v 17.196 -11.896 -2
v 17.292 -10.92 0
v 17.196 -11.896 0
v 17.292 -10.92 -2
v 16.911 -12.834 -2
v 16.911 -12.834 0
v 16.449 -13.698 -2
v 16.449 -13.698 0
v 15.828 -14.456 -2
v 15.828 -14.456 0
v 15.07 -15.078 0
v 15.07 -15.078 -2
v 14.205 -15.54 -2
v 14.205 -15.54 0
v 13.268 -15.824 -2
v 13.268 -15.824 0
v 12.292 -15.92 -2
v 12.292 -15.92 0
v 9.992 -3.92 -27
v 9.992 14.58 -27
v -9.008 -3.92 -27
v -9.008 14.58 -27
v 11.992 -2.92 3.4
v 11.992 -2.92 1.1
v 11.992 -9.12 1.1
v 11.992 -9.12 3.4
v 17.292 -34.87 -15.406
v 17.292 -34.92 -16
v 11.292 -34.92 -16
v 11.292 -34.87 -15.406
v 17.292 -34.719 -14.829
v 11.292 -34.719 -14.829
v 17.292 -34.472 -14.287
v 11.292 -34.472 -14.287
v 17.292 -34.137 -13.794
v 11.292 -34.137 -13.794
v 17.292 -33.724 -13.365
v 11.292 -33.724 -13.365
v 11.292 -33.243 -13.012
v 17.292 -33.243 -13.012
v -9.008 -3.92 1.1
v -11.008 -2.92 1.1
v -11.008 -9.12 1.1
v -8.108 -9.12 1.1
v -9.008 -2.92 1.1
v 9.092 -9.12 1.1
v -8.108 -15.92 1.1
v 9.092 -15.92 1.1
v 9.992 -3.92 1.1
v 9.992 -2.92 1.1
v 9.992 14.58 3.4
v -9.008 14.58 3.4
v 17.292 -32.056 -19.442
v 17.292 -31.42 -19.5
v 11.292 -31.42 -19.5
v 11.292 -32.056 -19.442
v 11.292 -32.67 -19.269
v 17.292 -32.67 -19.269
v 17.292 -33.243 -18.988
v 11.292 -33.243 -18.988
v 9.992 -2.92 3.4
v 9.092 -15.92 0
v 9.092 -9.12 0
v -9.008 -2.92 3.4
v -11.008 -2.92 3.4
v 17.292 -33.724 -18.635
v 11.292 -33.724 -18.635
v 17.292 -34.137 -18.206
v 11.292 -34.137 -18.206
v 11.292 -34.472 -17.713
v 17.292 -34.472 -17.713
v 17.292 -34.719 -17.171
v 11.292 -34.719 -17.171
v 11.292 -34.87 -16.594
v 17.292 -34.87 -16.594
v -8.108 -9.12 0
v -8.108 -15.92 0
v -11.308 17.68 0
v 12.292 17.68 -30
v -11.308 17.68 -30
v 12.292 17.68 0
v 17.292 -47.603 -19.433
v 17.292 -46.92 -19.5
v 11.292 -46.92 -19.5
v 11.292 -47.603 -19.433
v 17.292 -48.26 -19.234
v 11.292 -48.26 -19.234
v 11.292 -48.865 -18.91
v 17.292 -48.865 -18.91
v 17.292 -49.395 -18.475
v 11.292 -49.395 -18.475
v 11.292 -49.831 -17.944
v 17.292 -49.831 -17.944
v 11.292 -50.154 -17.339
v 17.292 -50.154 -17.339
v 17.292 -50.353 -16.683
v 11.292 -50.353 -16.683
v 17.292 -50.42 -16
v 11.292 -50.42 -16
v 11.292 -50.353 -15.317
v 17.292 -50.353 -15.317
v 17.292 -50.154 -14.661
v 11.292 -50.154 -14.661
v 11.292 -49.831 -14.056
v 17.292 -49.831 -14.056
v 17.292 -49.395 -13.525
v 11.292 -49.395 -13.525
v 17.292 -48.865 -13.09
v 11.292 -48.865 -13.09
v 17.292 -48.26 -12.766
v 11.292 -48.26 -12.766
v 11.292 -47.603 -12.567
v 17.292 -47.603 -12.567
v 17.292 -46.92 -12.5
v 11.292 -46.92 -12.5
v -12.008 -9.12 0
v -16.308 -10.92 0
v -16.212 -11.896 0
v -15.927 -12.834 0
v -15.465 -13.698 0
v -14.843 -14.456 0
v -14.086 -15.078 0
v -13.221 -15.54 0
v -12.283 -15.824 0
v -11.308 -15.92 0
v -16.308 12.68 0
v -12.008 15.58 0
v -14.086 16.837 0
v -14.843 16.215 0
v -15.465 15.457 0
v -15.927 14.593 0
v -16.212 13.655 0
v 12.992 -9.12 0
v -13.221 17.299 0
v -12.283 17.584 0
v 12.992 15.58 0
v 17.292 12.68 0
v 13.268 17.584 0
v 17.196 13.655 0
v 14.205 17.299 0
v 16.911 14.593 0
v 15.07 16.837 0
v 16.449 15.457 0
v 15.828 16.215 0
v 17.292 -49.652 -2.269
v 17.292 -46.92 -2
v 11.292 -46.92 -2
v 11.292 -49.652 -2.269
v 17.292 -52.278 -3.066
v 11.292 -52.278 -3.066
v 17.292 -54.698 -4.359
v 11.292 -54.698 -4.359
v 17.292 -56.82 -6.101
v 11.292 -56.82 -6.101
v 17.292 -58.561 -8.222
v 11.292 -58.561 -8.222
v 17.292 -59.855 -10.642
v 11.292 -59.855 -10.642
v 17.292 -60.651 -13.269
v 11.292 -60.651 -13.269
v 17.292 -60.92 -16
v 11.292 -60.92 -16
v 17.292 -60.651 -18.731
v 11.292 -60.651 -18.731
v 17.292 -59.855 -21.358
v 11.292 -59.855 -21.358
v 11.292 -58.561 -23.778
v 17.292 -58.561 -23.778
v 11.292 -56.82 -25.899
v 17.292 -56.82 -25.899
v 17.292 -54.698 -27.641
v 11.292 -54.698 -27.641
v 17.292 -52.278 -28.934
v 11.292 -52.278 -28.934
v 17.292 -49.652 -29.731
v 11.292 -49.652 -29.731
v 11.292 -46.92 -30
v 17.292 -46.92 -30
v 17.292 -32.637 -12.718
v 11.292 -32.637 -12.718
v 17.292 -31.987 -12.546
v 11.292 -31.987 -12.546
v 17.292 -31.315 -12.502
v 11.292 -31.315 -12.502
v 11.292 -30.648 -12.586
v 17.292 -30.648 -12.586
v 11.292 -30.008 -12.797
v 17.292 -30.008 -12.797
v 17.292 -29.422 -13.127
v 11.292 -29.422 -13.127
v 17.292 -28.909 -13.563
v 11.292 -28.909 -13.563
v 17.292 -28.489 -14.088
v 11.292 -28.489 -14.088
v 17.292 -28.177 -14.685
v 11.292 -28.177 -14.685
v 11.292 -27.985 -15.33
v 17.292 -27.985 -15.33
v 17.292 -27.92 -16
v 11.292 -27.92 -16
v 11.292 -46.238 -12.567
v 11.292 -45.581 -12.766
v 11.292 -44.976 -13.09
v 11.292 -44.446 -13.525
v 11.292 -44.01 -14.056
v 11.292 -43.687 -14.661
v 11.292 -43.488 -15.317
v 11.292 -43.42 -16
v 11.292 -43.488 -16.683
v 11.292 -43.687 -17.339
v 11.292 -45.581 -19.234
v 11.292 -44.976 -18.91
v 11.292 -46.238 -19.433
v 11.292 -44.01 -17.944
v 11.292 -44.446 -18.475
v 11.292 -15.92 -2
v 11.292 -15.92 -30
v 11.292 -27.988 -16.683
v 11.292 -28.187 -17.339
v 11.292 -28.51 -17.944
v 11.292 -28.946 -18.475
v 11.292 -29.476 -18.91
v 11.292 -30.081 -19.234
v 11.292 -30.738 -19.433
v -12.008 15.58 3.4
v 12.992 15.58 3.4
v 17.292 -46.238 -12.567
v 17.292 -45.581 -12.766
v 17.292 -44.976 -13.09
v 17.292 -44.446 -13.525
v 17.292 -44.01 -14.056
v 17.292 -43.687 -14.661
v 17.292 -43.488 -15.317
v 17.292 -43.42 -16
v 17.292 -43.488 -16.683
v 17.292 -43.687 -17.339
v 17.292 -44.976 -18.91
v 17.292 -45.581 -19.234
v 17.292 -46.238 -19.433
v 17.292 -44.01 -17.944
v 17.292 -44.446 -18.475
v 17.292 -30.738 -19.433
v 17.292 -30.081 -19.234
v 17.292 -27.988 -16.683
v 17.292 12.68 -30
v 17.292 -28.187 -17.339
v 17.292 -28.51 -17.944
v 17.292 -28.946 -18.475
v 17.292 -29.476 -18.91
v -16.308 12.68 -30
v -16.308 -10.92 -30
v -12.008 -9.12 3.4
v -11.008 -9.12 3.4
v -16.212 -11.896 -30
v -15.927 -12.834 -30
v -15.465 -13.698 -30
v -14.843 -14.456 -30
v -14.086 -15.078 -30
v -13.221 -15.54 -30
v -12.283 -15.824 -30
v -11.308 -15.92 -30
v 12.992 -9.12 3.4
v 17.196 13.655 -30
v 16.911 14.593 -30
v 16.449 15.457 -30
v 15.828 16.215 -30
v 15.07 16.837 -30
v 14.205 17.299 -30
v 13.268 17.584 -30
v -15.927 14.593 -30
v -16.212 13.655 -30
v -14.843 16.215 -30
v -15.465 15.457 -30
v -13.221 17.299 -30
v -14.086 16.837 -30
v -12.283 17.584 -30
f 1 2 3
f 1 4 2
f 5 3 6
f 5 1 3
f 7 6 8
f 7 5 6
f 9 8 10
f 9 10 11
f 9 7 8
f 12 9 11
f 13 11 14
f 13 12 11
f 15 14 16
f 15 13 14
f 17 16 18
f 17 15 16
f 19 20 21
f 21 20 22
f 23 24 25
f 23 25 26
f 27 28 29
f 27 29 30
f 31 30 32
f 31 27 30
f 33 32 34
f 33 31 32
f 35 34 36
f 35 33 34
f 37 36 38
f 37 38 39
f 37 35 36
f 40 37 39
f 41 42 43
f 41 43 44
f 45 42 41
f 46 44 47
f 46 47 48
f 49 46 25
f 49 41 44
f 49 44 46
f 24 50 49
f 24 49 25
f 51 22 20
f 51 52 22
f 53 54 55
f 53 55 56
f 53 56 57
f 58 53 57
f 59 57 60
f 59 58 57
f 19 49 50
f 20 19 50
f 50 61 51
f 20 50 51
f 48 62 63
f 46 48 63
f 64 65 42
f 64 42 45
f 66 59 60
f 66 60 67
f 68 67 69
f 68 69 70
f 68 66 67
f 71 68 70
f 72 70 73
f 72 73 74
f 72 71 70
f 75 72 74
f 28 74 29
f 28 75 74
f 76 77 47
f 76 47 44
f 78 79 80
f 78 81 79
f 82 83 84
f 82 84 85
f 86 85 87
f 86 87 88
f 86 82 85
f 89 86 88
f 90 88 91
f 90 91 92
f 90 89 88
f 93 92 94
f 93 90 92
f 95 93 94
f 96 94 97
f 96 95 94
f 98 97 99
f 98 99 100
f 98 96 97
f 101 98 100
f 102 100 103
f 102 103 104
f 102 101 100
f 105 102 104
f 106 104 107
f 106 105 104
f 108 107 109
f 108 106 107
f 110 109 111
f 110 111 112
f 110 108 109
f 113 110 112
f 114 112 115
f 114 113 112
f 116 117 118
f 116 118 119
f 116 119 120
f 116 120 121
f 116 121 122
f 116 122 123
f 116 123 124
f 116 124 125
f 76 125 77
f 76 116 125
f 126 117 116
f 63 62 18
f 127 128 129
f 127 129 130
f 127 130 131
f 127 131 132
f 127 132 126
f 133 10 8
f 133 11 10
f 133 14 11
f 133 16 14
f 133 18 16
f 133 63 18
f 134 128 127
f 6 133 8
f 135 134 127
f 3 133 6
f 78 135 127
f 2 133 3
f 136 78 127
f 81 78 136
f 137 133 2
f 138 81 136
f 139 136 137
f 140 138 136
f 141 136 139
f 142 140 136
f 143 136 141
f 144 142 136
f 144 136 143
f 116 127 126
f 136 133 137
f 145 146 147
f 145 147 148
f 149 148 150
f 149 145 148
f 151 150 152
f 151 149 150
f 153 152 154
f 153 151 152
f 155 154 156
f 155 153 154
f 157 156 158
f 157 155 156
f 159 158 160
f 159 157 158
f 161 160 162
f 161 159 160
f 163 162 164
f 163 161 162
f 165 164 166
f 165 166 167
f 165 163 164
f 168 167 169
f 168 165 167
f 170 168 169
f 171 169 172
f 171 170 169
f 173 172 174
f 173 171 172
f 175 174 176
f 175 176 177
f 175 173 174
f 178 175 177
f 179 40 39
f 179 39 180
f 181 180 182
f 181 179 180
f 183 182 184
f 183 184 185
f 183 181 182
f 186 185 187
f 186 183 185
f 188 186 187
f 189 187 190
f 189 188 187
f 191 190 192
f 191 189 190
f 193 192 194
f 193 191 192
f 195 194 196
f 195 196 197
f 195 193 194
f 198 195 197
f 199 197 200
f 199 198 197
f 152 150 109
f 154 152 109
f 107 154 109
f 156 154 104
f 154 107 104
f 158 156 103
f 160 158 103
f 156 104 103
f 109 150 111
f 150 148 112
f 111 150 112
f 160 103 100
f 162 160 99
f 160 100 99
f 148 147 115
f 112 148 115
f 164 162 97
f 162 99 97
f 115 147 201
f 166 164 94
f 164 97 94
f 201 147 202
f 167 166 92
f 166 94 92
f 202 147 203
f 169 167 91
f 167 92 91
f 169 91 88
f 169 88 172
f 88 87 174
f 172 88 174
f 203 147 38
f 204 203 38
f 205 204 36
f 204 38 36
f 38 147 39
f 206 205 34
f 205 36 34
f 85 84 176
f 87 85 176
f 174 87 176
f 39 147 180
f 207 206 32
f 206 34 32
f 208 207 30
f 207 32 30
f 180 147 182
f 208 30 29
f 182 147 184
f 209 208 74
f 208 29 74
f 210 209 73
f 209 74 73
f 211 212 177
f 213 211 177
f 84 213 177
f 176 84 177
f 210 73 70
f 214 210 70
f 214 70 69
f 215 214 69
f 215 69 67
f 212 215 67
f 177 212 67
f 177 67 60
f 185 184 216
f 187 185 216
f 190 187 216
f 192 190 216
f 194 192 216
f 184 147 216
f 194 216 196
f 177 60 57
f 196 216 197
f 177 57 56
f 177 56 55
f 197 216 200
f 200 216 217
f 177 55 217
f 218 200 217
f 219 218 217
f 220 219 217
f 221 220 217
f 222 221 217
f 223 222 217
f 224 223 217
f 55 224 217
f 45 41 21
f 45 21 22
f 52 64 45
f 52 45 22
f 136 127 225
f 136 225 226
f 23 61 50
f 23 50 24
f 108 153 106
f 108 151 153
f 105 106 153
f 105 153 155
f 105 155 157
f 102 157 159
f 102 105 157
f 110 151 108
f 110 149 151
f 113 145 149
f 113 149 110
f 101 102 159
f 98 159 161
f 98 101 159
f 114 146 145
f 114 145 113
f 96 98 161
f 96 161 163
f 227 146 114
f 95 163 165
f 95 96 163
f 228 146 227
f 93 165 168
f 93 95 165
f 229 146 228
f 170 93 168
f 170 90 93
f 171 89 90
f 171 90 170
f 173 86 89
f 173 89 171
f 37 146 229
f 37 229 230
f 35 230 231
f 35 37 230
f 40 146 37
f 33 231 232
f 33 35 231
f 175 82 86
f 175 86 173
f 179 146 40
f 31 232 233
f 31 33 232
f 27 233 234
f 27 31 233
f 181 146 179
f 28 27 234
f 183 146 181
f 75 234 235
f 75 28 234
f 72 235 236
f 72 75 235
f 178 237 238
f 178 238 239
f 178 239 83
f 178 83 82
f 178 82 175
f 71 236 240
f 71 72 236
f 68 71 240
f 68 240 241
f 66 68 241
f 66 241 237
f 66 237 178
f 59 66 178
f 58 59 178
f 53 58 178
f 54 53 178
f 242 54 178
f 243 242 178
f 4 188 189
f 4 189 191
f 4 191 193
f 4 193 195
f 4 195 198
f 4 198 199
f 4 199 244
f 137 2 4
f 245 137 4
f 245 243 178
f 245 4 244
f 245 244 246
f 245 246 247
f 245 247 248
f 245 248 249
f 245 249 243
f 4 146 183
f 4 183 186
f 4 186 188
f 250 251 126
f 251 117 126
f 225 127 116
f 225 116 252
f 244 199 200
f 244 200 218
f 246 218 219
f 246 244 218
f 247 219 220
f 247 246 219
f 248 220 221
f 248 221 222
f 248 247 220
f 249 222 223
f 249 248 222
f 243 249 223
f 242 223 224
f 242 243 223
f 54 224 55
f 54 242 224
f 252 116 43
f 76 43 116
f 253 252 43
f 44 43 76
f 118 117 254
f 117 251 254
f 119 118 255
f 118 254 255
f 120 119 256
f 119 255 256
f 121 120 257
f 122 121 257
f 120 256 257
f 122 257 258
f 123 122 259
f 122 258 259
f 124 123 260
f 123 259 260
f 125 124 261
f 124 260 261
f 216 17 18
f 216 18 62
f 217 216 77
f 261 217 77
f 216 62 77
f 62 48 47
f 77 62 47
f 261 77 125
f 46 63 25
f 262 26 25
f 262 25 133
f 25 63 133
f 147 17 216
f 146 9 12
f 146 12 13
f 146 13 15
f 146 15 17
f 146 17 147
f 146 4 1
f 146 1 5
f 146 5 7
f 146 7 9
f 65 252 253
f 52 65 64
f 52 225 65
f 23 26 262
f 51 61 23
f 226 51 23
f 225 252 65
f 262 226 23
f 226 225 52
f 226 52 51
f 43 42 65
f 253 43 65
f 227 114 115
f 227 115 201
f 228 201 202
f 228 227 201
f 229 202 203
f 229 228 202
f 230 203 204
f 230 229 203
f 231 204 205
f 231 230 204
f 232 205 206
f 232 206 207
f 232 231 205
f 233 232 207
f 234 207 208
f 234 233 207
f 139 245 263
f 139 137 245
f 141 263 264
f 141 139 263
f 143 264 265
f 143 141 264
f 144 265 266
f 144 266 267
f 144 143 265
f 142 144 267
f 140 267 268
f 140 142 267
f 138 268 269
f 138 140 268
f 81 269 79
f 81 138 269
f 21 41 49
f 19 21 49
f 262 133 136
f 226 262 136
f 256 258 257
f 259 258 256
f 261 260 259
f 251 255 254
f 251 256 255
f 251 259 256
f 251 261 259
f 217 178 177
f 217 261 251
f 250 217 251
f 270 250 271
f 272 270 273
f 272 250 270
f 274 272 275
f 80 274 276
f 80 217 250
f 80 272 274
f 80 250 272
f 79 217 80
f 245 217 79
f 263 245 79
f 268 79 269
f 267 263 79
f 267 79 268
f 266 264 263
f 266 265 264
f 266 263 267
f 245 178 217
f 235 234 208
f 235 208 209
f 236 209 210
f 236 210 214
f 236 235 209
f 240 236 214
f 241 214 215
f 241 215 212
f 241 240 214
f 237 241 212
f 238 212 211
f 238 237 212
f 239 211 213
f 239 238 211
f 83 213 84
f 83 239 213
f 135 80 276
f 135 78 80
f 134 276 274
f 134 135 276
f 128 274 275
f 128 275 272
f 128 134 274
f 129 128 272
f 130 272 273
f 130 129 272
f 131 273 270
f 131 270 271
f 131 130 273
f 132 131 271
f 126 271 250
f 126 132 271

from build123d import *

# Parameters (mm, degrees)
SKETCH1_W           = 25
SKETCH1_H           = 24.7
SKETCH1_W_2         = 19
SKETCH1_H_2         = 18.5
BOSS_EXTRUDE1_DEPTH = 3.4
SKETCH1_3_W         = 33.6
SKETCH1_3_H         = 33.6
SKETCH1_3_W_2       = 19
SKETCH1_3_H_2       = 18.5
BOSS_EXTRUDE2_DEPTH = 27
SKETCH2_W           = 33.6
SKETCH2_H           = 33.6
BOSS_EXTRUDE3_DEPTH = 3
SKETCH3_R           = 3.5
BOSS_EXTRUDE4_DEPTH = 6
FILLET1_R           = 5
SKETCH4_W           = 18
SKETCH4_H           = 5.2
CUT_EXTRUDE1_DEPTH  = 2.3
SKETCH5_W           = 17.2
SKETCH5_H           = 6.8
BOSS_EXTRUDE5_DEPTH = 1.1
SKETCH6_W           = 25
SKETCH6_H           = 6.2
CUT_EXTRUDE2_DEPTH  = 2.3
SKETCH7_W           = 1
SKETCH7_H           = 2.3
BOSS_EXTRUDE6_DEPTH = 6.2


with BuildPart() as part:
    # Sketch1 → Boss-Extrude1 (new body)
    with BuildSketch(Plane.XY):
        with Locations((0.492069479, 3.229581152)):
            Rectangle(SKETCH1_W, SKETCH1_H)
        with Locations((0.492069479, 5.329581152)):
            Rectangle(SKETCH1_W_2, SKETCH1_H_2, mode=Mode.SUBTRACT)
    extrude(amount=BOSS_EXTRUDE1_DEPTH)

    # Sketch1<3> → Boss-Extrude2 (add)
    with BuildSketch(Plane.XY):
        with Locations((0.492069479, 0.879581152)):
            Rectangle(SKETCH1_3_W, SKETCH1_3_H)
        with Locations((0.492069479, 5.329581152)):
            Rectangle(SKETCH1_3_W_2, SKETCH1_3_H_2, mode=Mode.SUBTRACT)
    extrude(amount=-BOSS_EXTRUDE2_DEPTH)

    # Sketch2 → Boss-Extrude3 (add)
    with BuildSketch(Plane(origin=(0, 0, -27), x_dir=(-1, 0, 0), z_dir=(0, 0, -1))):
        with Locations((-0.492069479, 0.879581152)):
            Rectangle(SKETCH2_W, SKETCH2_H)
    extrude(amount=BOSS_EXTRUDE3_DEPTH)

    # Sketch3 → Boss-Extrude4 (add)
    with BuildSketch(Plane(origin=(17.292069479, 0, 0), x_dir=(0, 0, -1), z_dir=(1, 0, 0))):
        with BuildLine():
            Line((30, -46.920418848), (30, -15.920418848))
            Line((30, -15.920418848), (2, -15.920418848))
            Line((2, -15.920418848), (2, -46.920418848))
            ThreePointArc((2, -46.920418848), (16, -60.920418848), (30, -46.920418848))
        make_face()
        with Locations((16, -46.920418848)):
            Circle(SKETCH3_R, mode=Mode.SUBTRACT)
        with Locations((16, -31.420418848)):
            Circle(SKETCH3_R, mode=Mode.SUBTRACT)
    extrude(amount=-BOSS_EXTRUDE4_DEPTH)

    # Fillet1
    fillet1_edges = [part.edges().sort_by_distance(p)[0] for p in [
        (17.292069479, -15.920418848, -1),
        (-16.307930521, -15.920418848, -15),
        (17.292069479, 17.679581152, -15),
        (-16.307930521, 17.679581152, -15),
    ]]
    fillet(fillet1_edges, radius=FILLET1_R)

    # Sketch4 → Cut-Extrude1 (cut)
    with BuildSketch(Plane.XY.offset(3.4)):
        with Locations((0.492069479, -6.520418848)):
            Rectangle(SKETCH4_W, SKETCH4_H)
    extrude(amount=-CUT_EXTRUDE1_DEPTH, mode=Mode.SUBTRACT)

    # Sketch5 → Boss-Extrude5 (add)
    with BuildSketch(Plane.XY):
        with Locations((0.492069479, -12.520418848)):
            Rectangle(SKETCH5_W, SKETCH5_H)
    extrude(amount=BOSS_EXTRUDE5_DEPTH)

    # Sketch6 → Cut-Extrude2 (cut)
    with BuildSketch(Plane.XY.offset(3.4)):
        with Locations((0.492069479, -6.020418848)):
            Rectangle(SKETCH6_W, SKETCH6_H)
    extrude(amount=-CUT_EXTRUDE2_DEPTH, mode=Mode.SUBTRACT)

    # Sketch7 → Boss-Extrude6 (add)
    with BuildSketch(Plane.XZ.offset(2.920418848)):
        with Locations((-11.507930521, 2.25)):
            Rectangle(SKETCH7_W, SKETCH7_H)
        with Locations((12.492069479, 2.25)):
            Rectangle(SKETCH7_W, SKETCH7_H)
    extrude(amount=BOSS_EXTRUDE6_DEPTH)


solid = part.part
